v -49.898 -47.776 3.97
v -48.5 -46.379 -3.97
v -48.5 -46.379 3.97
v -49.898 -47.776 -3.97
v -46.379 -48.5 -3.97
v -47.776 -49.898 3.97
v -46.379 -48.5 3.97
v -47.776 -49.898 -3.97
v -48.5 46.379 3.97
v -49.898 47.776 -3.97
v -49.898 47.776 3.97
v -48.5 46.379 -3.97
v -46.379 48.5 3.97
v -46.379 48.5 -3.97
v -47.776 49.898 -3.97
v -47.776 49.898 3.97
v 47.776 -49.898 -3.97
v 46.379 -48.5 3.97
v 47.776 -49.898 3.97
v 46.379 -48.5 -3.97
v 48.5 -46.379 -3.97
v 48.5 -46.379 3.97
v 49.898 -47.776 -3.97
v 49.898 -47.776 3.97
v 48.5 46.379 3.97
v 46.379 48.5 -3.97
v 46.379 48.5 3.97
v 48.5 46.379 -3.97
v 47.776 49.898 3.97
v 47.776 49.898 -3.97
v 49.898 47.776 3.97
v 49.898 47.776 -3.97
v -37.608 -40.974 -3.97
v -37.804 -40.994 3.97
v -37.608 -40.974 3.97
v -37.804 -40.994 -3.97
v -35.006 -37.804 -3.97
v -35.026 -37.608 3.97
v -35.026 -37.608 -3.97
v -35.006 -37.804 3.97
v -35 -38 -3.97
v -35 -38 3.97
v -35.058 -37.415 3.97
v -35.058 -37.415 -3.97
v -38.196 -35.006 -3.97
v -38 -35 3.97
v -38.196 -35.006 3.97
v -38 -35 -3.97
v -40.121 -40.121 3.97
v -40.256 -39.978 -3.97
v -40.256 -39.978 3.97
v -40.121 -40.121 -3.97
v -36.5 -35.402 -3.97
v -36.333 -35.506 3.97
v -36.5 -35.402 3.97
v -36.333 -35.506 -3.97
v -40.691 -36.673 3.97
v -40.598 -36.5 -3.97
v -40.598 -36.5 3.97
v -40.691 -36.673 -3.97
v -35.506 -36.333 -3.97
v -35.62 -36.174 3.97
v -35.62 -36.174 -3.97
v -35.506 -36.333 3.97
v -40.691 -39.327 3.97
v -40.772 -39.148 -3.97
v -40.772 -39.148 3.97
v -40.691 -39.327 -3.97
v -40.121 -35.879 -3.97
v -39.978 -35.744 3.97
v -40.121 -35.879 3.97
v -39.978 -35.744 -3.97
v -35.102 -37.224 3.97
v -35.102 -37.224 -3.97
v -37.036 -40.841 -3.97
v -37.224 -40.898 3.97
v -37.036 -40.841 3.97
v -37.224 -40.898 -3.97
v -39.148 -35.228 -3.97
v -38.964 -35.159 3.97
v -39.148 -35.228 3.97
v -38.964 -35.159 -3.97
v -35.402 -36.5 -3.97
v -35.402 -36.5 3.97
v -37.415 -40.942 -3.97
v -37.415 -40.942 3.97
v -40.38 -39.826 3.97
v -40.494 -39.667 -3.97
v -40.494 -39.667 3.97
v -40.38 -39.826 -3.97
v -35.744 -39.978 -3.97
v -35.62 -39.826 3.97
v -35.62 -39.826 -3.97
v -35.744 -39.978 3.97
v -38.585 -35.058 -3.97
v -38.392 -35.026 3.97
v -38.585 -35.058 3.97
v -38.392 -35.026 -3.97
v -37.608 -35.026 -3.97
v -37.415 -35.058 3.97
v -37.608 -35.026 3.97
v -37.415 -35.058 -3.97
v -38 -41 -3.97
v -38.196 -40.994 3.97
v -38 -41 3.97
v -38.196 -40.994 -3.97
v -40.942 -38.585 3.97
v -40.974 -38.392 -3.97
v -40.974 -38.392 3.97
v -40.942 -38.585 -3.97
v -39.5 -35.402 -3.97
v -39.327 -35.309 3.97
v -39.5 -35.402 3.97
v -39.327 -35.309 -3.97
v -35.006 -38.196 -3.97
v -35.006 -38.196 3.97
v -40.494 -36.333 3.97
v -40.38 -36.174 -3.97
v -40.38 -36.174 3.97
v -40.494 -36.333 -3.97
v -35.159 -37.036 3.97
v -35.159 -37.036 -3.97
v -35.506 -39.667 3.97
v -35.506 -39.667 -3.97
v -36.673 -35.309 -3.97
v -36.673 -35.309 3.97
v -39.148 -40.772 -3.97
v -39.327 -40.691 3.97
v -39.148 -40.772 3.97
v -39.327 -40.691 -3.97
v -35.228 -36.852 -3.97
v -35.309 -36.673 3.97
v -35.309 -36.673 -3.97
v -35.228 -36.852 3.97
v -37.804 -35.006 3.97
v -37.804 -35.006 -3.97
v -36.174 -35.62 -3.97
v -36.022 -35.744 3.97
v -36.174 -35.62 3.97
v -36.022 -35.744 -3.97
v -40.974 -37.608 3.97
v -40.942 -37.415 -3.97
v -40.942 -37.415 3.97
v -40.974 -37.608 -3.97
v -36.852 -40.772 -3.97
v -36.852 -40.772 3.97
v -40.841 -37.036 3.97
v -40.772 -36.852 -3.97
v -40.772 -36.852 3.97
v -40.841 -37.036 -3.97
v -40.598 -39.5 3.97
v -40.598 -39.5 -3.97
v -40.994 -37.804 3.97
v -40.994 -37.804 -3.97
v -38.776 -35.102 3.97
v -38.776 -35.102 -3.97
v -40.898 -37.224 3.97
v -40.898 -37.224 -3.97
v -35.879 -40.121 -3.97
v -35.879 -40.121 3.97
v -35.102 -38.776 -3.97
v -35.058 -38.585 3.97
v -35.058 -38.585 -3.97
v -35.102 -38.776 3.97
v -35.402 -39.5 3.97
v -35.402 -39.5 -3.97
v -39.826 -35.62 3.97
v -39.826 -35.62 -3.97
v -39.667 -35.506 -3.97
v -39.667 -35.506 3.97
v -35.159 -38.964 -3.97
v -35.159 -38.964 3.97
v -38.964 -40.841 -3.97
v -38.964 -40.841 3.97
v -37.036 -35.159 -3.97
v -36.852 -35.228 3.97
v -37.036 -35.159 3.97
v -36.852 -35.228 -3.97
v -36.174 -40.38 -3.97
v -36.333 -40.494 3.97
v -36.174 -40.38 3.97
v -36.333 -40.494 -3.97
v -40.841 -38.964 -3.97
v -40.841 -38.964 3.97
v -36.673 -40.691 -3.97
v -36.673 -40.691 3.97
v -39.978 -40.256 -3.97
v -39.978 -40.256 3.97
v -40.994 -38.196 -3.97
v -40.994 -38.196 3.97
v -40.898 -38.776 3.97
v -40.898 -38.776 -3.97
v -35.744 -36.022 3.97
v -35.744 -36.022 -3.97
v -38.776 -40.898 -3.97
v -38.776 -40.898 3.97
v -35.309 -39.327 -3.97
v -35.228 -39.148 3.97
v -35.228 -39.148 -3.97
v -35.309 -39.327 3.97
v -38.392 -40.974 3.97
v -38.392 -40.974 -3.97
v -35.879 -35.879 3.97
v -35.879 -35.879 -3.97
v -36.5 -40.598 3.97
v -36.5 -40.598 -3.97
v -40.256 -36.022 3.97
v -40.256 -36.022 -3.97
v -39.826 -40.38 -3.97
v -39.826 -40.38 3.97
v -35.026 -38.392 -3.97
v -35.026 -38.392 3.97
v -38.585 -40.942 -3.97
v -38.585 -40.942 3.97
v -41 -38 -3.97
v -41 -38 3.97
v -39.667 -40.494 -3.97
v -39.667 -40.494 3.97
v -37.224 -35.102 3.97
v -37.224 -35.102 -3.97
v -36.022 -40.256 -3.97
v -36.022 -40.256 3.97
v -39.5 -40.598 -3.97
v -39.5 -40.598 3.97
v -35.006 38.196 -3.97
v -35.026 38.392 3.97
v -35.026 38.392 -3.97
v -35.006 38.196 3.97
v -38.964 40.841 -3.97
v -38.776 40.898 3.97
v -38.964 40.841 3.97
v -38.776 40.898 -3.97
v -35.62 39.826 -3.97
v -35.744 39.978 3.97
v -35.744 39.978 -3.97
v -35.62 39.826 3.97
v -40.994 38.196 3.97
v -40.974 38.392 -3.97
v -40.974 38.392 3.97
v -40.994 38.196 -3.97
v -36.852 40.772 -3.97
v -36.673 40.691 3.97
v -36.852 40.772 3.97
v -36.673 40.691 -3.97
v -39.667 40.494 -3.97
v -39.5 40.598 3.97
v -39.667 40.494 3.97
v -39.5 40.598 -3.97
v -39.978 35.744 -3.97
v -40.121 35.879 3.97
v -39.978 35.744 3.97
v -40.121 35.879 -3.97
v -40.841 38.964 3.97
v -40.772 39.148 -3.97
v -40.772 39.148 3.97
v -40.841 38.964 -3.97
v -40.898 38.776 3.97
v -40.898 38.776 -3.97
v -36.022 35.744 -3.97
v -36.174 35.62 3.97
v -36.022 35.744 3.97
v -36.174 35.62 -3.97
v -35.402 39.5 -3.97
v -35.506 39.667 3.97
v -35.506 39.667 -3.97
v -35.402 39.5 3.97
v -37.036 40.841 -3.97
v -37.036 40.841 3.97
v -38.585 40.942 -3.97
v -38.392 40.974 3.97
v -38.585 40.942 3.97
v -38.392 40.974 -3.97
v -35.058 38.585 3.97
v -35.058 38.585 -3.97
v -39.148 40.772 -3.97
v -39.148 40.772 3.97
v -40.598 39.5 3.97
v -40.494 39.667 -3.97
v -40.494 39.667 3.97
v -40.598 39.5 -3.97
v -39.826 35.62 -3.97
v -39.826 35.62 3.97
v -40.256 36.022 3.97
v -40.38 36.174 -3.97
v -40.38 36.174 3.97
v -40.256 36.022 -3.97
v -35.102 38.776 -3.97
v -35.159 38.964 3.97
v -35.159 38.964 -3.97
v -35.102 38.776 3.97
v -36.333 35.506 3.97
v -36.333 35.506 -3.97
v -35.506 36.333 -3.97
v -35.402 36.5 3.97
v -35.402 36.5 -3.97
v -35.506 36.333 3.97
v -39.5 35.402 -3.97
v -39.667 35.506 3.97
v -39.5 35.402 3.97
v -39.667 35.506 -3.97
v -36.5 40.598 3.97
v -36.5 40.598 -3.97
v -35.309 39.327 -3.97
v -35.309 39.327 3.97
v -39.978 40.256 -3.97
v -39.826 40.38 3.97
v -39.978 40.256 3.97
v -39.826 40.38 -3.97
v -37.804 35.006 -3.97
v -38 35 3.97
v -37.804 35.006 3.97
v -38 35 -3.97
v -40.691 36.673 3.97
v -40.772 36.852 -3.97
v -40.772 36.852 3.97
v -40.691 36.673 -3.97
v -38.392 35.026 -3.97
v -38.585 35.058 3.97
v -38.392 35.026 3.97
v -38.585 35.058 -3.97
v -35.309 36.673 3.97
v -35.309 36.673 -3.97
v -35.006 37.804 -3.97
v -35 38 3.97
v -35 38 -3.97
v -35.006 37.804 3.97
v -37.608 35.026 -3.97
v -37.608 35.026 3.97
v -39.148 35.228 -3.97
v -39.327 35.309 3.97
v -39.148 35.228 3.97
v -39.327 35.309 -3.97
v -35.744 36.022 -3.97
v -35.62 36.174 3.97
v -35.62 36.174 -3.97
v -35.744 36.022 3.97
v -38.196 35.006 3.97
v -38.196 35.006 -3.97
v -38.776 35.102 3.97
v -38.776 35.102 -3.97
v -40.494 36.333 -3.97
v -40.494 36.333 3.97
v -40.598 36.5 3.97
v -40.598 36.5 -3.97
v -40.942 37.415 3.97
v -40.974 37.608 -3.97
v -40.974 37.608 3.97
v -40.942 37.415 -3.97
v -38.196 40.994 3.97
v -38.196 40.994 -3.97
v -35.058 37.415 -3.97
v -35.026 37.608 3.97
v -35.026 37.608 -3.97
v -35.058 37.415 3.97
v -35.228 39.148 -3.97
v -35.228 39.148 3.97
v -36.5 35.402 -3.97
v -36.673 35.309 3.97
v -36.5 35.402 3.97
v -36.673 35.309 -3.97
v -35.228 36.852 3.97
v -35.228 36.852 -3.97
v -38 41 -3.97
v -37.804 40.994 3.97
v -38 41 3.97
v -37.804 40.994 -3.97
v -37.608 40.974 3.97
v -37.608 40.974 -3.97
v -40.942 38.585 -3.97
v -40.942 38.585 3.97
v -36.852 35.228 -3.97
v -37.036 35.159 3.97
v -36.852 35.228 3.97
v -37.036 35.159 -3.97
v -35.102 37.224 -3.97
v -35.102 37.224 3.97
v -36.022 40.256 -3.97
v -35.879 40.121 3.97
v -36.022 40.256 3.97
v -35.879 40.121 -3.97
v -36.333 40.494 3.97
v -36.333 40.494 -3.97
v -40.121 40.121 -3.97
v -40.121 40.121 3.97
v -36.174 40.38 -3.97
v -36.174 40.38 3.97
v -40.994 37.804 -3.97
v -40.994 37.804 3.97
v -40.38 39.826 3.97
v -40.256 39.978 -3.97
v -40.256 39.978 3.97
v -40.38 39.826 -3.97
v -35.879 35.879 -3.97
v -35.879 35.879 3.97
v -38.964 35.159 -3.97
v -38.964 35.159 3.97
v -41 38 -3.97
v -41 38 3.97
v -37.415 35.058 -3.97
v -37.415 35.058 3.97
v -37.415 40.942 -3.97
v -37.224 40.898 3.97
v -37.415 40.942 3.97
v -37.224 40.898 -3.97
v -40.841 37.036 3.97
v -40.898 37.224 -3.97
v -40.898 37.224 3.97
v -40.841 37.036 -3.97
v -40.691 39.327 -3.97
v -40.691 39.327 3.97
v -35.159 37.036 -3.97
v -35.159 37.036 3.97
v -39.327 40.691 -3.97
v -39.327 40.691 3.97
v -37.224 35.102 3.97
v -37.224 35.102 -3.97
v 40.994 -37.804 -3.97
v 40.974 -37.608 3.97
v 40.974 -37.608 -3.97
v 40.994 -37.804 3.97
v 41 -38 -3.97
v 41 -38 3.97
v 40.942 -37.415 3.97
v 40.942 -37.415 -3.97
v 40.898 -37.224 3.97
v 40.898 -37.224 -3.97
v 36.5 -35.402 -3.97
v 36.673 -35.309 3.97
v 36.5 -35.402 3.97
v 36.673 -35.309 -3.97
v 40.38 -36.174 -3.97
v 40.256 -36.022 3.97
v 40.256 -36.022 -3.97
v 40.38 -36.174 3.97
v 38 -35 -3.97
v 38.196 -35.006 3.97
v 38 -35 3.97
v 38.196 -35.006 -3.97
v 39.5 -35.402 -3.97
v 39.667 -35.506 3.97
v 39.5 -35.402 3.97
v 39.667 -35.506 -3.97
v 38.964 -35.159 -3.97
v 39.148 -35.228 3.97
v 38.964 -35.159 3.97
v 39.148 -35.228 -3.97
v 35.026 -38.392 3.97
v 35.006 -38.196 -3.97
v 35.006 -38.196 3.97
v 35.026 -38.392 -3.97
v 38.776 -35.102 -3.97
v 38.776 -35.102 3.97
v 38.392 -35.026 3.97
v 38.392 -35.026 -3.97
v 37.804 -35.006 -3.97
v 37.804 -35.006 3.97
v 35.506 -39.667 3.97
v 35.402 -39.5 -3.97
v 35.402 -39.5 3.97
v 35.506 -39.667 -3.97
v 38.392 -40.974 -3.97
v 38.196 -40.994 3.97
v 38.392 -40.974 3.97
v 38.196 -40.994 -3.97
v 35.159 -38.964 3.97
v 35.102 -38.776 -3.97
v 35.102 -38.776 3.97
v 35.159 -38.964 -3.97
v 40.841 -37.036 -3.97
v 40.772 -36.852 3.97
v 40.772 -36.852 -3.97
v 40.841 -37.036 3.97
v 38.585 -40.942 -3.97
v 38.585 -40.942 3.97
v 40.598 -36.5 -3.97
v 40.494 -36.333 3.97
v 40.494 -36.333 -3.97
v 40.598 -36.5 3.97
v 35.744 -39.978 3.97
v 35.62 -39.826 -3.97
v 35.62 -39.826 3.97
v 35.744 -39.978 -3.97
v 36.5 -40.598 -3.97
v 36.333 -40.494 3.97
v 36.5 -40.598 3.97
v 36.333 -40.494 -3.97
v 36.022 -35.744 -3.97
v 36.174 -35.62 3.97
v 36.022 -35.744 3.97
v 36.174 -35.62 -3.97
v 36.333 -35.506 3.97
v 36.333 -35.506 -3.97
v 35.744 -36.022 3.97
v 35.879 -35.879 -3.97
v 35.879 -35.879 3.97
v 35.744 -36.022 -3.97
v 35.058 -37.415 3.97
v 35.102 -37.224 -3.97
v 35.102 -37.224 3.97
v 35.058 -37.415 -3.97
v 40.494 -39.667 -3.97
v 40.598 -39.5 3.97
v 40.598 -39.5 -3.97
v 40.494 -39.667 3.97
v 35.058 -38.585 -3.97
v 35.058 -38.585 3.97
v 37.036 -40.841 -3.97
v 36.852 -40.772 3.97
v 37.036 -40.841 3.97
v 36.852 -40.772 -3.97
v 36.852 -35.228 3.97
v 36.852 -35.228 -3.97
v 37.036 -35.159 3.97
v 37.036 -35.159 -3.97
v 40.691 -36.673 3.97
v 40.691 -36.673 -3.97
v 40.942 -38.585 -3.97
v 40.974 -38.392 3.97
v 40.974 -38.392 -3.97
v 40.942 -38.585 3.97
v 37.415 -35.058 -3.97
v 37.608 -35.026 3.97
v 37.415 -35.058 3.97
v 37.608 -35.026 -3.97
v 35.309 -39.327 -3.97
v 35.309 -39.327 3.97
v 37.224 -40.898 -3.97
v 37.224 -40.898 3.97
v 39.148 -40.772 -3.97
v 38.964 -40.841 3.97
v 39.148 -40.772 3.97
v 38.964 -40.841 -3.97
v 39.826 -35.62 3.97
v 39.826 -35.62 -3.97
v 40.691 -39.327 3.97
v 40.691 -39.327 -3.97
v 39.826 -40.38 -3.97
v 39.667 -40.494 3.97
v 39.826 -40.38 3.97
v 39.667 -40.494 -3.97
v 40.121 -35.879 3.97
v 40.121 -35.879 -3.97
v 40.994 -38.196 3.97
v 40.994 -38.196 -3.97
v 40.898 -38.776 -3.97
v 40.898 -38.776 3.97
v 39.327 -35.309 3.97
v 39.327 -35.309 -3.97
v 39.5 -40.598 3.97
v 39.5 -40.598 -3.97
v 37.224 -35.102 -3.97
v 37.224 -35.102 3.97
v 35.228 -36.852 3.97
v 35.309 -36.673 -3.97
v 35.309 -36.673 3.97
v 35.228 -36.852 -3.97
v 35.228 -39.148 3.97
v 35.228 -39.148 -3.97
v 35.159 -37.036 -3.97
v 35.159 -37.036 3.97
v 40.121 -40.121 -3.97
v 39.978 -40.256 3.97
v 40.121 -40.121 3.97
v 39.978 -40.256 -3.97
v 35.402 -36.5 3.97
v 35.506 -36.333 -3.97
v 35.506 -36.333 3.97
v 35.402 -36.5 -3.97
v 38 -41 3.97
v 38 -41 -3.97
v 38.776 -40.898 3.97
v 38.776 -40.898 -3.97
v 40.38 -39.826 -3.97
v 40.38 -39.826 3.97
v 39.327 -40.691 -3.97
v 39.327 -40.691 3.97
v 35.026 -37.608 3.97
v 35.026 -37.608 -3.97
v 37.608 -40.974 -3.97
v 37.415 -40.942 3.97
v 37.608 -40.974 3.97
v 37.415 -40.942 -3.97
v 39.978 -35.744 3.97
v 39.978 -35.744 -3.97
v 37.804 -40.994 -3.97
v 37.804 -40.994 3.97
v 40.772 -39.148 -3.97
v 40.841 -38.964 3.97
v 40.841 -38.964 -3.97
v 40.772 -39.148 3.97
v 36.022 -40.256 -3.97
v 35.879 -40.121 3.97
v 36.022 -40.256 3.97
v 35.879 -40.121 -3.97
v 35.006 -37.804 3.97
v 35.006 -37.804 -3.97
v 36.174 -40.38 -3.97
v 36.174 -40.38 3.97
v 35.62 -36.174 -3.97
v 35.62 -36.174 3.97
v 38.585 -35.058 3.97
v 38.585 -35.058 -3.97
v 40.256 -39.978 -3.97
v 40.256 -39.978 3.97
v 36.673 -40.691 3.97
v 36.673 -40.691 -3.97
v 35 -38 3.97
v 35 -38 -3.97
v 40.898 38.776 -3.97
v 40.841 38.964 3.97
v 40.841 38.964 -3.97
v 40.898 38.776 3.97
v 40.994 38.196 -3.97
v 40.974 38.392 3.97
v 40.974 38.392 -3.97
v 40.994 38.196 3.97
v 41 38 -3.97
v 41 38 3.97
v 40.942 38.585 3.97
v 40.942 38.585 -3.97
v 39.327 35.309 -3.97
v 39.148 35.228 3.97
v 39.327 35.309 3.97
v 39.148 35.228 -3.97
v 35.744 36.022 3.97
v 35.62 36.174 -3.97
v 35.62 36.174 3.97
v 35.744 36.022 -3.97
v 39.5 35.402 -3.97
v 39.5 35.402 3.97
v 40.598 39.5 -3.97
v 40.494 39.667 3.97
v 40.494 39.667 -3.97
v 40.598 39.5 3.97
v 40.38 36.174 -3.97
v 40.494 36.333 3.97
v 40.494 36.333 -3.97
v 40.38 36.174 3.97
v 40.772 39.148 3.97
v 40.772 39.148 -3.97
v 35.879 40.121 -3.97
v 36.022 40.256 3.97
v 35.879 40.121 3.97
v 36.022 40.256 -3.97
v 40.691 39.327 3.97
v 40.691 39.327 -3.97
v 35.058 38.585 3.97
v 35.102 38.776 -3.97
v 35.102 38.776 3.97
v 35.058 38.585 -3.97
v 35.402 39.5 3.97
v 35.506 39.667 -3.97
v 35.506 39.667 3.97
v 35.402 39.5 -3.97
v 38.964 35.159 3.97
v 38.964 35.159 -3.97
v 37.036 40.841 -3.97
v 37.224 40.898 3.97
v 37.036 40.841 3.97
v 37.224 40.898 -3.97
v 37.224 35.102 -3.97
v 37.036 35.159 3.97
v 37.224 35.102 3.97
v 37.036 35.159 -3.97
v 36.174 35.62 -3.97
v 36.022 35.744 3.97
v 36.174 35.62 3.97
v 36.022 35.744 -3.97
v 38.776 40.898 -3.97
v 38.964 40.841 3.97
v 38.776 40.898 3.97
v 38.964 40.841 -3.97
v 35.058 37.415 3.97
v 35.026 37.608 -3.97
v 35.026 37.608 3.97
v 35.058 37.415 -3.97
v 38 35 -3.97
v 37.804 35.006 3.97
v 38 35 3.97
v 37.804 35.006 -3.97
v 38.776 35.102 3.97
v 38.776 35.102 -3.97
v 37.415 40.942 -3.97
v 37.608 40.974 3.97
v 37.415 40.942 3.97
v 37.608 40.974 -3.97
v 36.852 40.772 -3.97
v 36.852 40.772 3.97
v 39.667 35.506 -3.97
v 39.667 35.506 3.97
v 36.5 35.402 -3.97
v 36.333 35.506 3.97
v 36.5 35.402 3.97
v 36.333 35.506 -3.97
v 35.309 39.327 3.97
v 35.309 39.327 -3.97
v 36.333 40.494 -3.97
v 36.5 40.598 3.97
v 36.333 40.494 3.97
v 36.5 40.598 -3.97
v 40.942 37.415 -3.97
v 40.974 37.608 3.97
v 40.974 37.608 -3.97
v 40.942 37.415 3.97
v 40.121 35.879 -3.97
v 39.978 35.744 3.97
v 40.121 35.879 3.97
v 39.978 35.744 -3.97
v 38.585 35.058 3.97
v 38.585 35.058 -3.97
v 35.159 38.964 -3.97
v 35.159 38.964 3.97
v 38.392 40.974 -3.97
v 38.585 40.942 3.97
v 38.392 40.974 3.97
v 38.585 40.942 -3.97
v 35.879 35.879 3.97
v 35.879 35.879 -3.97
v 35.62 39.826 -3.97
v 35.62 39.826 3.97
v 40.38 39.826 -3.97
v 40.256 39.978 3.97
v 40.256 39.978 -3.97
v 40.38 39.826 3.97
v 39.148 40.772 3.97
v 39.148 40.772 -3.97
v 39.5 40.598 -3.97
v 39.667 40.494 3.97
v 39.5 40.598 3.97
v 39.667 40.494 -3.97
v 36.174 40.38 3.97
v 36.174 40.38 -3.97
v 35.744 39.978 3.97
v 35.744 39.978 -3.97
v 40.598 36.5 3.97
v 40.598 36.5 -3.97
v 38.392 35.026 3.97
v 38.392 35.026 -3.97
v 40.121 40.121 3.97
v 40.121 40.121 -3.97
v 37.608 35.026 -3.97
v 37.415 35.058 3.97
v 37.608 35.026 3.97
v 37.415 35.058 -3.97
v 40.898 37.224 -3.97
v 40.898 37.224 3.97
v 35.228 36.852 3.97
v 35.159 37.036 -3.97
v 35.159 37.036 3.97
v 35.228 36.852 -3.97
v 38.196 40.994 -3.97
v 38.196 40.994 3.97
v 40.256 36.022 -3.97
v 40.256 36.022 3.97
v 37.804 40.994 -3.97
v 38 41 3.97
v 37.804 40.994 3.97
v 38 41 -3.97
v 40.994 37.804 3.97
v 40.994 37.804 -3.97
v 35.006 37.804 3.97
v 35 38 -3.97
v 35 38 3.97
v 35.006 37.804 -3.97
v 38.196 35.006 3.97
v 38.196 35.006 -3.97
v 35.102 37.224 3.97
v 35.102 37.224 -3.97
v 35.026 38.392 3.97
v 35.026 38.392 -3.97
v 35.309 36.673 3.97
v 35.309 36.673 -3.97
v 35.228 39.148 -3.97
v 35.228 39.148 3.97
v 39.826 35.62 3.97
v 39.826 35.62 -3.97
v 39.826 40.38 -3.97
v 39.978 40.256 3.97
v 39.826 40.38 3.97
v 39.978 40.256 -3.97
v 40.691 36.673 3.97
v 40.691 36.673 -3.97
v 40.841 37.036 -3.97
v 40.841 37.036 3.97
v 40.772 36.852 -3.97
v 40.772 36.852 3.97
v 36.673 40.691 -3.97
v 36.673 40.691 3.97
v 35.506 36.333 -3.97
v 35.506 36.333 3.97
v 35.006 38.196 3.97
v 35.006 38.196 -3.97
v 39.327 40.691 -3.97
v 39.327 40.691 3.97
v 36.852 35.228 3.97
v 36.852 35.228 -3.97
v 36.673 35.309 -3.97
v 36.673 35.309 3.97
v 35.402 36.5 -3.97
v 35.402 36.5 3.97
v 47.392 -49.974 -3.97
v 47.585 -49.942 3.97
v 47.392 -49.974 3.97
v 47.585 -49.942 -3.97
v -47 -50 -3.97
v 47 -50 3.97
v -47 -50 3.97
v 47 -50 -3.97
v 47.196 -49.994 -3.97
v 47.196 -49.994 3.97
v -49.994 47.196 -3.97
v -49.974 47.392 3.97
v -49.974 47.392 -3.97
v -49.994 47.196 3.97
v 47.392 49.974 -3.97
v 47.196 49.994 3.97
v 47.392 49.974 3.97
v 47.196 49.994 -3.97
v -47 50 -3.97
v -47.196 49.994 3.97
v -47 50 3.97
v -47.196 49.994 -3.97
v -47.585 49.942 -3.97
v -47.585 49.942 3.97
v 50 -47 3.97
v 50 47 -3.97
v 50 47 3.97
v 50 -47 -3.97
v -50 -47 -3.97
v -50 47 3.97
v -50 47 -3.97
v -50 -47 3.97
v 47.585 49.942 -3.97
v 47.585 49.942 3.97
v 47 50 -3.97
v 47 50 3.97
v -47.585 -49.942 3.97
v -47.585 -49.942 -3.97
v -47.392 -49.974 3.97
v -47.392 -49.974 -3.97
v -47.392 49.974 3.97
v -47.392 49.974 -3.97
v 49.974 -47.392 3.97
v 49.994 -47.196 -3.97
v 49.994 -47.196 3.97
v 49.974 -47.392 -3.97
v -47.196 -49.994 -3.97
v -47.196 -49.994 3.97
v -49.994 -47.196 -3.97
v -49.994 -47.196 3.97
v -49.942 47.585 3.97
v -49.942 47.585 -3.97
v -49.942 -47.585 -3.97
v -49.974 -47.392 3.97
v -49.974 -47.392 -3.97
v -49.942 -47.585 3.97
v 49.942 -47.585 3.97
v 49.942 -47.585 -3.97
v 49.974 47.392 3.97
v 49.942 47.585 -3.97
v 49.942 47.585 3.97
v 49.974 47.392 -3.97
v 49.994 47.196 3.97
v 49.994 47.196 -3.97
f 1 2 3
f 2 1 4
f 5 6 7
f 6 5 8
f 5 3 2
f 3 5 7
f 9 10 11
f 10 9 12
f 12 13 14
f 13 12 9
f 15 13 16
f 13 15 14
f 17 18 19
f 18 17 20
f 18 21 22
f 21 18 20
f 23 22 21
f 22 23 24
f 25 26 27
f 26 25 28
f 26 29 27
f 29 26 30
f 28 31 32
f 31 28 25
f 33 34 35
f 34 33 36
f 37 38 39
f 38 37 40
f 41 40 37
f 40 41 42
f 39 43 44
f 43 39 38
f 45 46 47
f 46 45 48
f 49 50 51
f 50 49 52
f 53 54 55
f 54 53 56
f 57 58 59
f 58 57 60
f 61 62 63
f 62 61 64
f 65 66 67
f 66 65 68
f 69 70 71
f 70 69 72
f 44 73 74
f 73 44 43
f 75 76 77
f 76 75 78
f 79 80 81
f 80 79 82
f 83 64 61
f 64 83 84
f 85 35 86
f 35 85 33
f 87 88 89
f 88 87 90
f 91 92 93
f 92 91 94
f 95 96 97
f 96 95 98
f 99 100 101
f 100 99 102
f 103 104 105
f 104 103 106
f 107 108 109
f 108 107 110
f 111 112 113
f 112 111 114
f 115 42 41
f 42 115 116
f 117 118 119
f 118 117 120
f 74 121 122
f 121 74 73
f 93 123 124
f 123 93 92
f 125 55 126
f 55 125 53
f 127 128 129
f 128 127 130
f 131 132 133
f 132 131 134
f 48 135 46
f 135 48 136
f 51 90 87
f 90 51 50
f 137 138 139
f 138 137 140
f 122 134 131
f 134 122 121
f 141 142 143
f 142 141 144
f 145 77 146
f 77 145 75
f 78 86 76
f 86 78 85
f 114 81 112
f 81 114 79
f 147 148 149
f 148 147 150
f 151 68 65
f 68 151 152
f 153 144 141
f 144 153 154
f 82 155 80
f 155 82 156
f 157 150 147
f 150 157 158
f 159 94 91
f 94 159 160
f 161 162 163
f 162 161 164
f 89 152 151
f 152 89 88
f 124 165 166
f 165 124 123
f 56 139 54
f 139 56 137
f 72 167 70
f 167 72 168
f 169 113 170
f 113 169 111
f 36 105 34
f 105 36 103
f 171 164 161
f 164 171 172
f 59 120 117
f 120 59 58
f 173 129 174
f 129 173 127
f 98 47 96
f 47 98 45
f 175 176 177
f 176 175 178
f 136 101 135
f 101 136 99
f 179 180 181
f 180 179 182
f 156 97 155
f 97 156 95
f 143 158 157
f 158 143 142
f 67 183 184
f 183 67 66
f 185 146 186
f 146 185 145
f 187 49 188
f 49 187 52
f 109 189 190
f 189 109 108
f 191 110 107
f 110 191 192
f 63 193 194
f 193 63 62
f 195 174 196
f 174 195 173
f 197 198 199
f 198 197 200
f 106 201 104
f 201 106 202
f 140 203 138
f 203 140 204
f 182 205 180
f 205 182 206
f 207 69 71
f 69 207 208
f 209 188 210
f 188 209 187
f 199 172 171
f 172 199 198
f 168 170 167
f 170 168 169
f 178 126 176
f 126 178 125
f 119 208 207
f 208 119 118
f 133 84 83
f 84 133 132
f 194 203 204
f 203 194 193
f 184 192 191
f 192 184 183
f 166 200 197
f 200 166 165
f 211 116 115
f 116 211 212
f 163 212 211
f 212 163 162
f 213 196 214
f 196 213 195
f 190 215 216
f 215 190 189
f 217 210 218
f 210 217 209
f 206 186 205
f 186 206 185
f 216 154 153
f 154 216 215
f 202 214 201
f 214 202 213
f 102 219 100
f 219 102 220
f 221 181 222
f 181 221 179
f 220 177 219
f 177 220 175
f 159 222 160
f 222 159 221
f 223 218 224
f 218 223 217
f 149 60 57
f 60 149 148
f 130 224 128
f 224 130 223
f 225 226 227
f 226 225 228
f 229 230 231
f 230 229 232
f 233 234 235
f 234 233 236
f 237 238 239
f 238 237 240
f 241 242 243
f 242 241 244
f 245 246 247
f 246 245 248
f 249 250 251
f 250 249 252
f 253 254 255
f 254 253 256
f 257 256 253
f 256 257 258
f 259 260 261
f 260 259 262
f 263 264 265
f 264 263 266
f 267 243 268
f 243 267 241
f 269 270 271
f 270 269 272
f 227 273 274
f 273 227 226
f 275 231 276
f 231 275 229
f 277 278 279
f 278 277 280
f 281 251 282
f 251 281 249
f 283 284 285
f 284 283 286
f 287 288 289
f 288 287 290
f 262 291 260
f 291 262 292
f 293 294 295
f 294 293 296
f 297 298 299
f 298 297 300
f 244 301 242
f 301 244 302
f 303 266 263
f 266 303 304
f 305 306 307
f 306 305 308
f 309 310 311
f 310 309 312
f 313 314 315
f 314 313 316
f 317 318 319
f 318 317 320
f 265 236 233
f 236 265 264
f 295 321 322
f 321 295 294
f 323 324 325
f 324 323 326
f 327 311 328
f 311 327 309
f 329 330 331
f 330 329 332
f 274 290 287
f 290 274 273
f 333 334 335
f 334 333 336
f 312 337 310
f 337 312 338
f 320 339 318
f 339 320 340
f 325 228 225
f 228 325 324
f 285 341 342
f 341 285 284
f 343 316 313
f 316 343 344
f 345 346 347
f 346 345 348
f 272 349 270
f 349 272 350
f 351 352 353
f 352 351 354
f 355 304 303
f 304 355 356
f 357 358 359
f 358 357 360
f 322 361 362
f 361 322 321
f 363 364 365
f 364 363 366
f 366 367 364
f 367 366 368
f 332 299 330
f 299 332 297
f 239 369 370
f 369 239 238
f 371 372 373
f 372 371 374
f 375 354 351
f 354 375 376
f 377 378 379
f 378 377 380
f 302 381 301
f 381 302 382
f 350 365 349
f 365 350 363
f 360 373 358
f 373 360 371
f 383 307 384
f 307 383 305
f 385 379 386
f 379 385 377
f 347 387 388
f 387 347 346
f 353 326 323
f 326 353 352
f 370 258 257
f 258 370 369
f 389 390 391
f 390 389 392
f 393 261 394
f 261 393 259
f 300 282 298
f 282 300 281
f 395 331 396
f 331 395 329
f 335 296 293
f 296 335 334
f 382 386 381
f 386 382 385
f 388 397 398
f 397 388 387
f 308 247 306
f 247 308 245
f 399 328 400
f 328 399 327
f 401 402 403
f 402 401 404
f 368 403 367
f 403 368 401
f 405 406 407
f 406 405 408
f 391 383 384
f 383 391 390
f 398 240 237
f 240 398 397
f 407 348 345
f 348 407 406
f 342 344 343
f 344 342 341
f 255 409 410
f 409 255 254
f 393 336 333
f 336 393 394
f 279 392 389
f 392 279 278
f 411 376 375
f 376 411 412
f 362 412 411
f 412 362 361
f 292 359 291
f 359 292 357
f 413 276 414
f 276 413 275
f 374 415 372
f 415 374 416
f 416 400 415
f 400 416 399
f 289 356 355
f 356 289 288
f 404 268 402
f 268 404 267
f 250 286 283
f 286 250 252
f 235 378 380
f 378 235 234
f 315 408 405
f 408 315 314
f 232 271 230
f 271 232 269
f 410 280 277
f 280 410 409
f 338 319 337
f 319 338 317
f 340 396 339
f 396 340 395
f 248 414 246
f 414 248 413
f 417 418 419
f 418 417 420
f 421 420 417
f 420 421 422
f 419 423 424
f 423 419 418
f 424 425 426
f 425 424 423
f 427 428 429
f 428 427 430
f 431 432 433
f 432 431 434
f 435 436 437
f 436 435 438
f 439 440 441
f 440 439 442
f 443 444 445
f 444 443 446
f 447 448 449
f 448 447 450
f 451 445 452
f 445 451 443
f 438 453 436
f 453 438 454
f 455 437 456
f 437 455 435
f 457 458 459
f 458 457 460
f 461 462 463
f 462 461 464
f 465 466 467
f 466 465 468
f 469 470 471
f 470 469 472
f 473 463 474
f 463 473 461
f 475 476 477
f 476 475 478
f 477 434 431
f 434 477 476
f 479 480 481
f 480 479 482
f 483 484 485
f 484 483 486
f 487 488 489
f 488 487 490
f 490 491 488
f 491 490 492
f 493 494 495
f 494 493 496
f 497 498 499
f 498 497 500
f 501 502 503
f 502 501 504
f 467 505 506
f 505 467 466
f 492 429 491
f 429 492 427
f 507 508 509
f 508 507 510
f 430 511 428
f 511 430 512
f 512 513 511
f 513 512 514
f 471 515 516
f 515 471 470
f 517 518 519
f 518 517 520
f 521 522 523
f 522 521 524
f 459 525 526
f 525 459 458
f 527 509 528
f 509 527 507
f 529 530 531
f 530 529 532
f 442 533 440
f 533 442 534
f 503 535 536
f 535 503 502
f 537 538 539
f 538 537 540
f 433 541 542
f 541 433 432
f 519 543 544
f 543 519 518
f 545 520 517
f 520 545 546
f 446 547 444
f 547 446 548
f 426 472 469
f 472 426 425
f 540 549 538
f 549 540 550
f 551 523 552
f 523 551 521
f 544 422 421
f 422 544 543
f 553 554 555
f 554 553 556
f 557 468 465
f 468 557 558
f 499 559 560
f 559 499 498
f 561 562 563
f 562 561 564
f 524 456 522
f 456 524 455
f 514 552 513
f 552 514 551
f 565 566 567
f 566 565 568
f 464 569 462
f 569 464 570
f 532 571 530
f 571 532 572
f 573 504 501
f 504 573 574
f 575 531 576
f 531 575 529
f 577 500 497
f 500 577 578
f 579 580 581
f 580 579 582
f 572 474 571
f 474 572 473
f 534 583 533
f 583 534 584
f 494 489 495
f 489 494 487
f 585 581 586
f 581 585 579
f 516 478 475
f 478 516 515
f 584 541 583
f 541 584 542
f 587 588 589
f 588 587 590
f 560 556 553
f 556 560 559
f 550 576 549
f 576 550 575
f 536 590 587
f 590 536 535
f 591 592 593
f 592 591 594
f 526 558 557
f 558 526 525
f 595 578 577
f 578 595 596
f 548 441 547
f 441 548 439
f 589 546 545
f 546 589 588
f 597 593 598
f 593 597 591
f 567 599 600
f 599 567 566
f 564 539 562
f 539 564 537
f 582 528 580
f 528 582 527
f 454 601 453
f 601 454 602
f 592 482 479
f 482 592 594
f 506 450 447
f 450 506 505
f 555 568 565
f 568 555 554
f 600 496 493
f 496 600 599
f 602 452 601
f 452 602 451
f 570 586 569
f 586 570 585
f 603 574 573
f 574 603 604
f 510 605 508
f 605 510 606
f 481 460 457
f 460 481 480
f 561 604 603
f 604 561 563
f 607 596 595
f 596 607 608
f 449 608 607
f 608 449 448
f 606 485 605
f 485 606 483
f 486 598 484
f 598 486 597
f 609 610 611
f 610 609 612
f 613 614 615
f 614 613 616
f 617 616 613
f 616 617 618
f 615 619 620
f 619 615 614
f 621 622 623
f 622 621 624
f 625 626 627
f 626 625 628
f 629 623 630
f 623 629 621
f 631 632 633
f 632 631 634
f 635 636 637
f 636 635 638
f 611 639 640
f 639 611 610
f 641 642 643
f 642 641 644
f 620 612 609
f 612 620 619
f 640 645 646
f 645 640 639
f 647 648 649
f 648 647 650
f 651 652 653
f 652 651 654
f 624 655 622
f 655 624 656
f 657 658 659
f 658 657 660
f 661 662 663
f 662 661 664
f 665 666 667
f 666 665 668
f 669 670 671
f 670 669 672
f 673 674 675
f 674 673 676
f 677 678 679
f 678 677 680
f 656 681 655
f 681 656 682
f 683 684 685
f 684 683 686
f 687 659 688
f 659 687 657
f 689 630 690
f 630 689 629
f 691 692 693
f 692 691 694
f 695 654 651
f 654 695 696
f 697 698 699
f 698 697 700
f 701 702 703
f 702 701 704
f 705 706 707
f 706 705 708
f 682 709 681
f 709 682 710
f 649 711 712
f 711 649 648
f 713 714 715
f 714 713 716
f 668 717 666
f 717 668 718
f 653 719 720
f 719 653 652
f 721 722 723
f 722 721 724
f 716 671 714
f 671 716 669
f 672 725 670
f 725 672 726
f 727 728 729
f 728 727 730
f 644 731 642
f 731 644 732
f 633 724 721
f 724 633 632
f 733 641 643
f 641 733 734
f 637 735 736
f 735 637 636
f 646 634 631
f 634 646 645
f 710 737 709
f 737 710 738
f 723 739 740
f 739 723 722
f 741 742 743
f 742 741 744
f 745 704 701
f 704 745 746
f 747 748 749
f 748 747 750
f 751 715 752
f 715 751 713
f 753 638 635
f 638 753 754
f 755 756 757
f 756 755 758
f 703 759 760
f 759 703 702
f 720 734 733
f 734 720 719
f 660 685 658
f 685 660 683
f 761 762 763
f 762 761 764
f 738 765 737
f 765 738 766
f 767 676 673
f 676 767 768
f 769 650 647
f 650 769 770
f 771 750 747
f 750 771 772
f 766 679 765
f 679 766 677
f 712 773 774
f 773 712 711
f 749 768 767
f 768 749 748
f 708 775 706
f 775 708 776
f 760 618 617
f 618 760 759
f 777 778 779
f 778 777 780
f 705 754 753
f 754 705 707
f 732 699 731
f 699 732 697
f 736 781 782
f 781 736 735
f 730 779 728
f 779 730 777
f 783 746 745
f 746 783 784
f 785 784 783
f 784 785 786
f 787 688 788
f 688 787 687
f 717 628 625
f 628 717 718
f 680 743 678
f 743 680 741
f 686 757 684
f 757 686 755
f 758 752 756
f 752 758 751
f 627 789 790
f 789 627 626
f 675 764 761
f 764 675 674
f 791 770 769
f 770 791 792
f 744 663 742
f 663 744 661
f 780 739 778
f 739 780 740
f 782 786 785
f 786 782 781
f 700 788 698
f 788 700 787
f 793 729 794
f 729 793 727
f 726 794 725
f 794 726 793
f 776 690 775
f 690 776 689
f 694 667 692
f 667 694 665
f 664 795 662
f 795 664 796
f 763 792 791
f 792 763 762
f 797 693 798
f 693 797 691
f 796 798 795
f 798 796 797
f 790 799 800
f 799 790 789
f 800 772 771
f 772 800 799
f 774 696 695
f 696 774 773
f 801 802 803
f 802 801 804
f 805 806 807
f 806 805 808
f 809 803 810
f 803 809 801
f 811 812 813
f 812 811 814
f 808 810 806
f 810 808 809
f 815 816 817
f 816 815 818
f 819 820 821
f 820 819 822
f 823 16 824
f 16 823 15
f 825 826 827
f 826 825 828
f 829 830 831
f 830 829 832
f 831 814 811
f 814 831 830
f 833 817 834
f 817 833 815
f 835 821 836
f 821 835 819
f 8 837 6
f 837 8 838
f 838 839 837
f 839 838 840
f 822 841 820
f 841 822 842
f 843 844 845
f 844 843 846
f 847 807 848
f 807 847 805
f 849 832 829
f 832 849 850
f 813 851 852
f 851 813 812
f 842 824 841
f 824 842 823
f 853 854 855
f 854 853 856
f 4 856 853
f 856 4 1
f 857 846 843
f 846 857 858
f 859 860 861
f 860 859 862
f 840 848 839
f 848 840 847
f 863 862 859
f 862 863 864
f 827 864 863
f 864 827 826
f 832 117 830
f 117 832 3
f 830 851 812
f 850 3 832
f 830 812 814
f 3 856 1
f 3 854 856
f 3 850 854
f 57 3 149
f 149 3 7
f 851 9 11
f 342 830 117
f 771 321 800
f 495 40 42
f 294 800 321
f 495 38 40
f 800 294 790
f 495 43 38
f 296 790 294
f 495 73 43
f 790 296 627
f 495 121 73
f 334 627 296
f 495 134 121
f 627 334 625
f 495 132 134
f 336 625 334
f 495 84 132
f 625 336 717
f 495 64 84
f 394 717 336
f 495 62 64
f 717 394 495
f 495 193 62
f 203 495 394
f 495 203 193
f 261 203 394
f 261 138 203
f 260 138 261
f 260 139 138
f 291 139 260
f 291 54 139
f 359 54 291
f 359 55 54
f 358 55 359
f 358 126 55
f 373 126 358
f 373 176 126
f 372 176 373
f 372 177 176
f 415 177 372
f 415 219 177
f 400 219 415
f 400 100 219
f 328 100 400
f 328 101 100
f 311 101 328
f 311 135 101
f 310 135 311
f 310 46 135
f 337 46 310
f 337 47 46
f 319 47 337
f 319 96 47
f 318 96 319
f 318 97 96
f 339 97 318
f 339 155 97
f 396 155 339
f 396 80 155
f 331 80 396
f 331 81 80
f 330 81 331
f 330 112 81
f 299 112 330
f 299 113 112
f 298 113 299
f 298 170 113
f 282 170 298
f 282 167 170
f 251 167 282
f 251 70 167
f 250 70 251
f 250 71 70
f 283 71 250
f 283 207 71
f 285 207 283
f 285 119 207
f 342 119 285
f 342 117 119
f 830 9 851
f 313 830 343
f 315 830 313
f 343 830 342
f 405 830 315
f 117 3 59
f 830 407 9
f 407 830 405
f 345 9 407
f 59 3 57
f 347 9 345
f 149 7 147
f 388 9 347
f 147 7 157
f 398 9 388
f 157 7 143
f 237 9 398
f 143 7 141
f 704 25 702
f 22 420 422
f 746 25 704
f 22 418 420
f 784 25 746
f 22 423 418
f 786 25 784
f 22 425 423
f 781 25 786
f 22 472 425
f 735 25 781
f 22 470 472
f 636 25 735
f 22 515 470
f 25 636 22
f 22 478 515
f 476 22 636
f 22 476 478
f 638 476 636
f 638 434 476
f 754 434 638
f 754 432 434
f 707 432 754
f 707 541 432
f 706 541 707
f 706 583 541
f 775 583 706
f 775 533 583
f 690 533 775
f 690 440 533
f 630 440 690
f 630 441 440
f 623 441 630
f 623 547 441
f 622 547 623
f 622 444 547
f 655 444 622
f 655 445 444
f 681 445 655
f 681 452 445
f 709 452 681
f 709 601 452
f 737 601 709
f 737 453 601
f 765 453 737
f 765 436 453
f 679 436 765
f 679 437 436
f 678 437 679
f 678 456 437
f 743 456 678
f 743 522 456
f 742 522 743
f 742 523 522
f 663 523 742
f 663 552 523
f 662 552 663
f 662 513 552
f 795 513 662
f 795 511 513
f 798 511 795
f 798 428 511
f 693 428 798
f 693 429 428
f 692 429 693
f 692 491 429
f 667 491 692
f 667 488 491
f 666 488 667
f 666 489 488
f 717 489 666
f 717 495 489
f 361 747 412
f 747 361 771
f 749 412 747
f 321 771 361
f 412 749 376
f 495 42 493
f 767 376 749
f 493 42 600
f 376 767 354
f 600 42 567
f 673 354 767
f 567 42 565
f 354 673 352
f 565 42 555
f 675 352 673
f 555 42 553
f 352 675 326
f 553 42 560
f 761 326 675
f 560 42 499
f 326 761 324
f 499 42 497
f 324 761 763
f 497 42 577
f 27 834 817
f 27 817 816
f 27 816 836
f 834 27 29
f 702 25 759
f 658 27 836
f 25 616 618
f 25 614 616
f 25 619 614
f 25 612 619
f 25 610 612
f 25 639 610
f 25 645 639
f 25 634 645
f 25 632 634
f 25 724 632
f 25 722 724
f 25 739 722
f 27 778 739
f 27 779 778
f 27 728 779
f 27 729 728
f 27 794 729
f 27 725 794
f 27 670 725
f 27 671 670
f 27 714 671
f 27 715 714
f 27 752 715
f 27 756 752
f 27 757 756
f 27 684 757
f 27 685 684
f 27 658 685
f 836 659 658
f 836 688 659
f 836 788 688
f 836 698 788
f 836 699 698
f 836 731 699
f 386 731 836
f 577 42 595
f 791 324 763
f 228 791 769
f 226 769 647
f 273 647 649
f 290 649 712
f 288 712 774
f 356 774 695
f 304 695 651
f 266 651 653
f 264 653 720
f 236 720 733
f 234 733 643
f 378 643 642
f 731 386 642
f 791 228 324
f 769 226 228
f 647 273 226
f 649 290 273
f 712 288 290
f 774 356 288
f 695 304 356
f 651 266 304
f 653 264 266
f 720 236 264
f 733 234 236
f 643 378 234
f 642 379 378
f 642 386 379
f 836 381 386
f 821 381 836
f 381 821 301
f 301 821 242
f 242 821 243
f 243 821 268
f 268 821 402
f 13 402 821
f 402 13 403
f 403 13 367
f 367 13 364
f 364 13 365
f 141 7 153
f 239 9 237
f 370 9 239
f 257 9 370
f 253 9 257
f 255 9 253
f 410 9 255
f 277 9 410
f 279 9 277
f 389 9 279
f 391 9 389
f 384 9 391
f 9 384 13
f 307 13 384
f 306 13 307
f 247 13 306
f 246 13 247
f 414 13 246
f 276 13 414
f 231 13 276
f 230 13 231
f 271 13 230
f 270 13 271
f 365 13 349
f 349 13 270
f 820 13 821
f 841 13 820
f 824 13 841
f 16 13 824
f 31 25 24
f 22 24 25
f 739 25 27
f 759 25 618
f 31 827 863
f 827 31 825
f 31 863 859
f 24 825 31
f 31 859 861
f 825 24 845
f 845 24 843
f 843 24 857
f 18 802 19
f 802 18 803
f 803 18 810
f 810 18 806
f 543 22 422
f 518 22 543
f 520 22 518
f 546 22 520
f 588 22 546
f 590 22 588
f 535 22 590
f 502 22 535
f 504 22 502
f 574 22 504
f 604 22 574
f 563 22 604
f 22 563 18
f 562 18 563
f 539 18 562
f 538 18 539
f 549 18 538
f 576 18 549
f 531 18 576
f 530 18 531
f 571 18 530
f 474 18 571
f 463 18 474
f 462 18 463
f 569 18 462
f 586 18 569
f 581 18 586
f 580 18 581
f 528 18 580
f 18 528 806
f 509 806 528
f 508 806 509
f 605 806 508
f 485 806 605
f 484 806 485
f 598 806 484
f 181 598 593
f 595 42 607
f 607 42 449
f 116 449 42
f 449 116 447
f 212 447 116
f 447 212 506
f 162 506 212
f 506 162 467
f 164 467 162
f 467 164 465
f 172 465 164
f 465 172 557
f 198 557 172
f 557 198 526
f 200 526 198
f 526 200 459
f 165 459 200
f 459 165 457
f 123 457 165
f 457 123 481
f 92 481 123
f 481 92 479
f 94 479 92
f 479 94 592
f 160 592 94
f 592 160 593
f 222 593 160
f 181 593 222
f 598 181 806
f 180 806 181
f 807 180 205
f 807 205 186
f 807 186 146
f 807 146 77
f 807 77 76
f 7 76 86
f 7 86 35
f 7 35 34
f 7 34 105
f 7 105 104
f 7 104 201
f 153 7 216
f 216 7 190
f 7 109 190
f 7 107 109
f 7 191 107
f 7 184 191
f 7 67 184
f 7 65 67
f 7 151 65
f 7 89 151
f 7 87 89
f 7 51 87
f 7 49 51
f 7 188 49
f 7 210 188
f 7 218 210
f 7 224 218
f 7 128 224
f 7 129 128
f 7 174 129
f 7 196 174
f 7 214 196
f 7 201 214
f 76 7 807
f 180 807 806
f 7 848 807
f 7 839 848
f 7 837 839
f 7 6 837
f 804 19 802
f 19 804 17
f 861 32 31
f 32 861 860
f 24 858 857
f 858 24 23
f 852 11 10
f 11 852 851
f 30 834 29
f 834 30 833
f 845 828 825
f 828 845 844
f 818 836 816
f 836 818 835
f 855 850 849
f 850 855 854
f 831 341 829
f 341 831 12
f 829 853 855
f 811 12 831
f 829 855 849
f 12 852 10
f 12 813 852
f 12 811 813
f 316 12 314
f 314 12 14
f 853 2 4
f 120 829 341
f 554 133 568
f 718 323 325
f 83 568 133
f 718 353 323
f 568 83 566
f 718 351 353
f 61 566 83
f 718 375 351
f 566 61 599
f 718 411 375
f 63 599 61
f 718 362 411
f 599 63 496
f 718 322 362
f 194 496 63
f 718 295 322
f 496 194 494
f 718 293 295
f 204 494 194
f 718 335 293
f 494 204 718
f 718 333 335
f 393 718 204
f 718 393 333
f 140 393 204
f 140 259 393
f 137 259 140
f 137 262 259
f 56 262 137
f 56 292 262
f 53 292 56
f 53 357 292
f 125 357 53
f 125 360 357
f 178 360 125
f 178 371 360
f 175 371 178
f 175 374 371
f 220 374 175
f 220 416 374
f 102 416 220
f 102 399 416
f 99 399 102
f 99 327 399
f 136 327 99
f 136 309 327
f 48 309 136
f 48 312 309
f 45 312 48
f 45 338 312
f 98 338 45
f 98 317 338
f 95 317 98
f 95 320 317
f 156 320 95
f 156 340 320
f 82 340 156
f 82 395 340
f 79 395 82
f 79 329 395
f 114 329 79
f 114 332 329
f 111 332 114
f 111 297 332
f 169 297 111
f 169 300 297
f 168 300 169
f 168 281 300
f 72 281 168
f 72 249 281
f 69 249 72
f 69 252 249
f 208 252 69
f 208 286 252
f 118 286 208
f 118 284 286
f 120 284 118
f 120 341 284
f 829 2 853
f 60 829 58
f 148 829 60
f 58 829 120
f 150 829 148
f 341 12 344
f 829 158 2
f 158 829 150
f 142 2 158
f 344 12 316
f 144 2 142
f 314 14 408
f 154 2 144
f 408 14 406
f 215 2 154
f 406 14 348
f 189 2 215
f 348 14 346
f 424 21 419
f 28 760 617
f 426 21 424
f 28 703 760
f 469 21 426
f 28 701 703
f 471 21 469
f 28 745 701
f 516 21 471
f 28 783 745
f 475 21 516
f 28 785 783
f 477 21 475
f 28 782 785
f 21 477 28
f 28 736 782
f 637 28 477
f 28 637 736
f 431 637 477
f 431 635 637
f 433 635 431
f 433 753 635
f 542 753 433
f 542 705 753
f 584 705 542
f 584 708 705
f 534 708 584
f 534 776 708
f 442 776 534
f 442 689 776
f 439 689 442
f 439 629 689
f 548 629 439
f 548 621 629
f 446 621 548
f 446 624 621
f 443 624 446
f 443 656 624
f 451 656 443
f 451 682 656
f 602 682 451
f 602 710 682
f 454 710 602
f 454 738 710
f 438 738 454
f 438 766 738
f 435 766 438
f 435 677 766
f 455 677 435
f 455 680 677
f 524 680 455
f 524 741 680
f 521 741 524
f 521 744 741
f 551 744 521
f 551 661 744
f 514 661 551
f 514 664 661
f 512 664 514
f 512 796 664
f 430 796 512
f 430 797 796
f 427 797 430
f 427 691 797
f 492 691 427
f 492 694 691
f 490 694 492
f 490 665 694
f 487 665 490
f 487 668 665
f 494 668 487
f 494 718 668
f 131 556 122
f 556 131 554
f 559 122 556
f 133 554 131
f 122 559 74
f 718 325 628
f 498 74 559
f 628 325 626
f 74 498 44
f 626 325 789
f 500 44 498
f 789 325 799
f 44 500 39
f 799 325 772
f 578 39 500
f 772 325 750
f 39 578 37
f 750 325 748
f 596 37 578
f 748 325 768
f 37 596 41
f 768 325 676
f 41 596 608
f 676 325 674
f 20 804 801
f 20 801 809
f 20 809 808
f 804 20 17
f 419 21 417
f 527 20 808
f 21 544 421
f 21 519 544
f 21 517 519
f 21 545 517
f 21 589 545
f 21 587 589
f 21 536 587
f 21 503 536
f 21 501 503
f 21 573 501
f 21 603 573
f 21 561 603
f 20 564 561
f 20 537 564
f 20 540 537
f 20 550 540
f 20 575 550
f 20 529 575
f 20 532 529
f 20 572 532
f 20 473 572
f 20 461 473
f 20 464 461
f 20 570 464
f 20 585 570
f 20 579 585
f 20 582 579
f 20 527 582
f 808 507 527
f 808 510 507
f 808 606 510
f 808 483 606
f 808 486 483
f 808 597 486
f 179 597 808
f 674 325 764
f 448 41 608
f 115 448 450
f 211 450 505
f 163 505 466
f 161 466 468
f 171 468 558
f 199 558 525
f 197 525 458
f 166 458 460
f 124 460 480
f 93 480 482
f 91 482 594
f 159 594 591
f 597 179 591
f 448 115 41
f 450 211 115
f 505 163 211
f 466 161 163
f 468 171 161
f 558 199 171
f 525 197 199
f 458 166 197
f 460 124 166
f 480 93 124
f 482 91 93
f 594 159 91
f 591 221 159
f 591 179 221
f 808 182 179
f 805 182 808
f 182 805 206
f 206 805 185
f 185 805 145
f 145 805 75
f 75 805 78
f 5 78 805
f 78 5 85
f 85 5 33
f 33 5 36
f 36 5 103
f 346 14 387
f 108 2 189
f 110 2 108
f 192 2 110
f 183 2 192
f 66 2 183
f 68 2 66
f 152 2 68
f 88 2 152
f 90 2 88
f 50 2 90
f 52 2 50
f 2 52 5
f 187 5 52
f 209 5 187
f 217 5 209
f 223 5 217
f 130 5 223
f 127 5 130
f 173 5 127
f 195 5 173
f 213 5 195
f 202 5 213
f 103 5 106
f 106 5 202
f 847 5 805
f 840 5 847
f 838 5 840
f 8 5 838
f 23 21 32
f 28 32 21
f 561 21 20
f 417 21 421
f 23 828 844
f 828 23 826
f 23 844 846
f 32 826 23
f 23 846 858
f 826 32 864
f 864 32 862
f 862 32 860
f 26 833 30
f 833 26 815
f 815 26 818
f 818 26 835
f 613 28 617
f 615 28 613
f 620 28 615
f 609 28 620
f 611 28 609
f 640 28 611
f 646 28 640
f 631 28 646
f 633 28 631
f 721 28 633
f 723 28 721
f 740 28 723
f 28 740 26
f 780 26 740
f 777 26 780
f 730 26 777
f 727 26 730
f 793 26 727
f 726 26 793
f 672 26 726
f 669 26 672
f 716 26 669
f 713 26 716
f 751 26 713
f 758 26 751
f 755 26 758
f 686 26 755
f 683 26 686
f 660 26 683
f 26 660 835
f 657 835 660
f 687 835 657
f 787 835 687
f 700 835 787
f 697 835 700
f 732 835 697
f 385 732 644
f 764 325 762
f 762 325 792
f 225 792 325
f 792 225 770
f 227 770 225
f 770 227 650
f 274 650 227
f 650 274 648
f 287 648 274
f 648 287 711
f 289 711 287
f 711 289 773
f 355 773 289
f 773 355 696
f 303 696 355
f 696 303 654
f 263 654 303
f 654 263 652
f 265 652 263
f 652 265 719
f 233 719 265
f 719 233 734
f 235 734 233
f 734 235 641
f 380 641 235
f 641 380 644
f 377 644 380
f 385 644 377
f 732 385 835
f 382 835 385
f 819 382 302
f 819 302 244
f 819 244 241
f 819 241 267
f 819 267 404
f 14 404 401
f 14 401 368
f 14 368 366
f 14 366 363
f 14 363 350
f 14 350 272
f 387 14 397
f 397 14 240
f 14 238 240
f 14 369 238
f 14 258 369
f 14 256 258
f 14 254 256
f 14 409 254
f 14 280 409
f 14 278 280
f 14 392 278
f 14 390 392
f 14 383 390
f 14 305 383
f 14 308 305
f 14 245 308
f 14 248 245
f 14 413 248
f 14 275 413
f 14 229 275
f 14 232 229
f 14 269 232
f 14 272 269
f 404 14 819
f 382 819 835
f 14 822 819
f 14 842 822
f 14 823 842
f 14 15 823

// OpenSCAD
$fn = 96;

// Parameters (mm)
sheet_L = 100;                 // length
sheet_W = 100;                 // width
sheet_T = 7.94;                // ~5/16" = 7.9375mm
corner_r = 3;                  // outer corner fillet radius
edge_chamfer = 1.5;            // 45° chamfer size (inset from each edge)
hole_d = 6;                    // mounting hole diameter
hole_edge_offset = 12;         // hole center offset from each edge
overlap = 0.2;                 // small overlap for robust booleans

// Guardrails to avoid empty/invalid geometry
corner_r_eff = min(corner_r, min(sheet_L, sheet_W)/2 - overlap);
chamfer_eff  = min(edge_chamfer, min(sheet_L, sheet_W)/2 - overlap);
hole_off_x   = min(hole_edge_offset, sheet_L/2 - hole_d/2 - overlap);
hole_off_y   = min(hole_edge_offset, sheet_W/2 - hole_d/2 - overlap);

module rounded_rect_prism(L, W, T, R) {
    linear_extrude(height=T, center=true)
        offset(r=R)
            square([L - 2*R, W - 2*R], center=true);
}

module chamfer_cuts(L, W, T, c) {
    // Cut 45° chamfers at the four corners (top view)
    for (sx = [-1, 1], sy = [-1, 1]) {
        translate([sx*(L/2 - c), sy*(W/2 - c), 0])
            rotate([0, 0, 45])
                cube([2*c, 2*c, T + 2*overlap], center=true);
    }
}

module mounting_holes(L, W, T, d, offx, offy) {
    for (sx = [-1, 1], sy = [-1, 1]) {
        translate([sx*(L/2 - offx), sy*(W/2 - offy), 0])
            cylinder(d=d, h=T + 2*overlap, center=true);
    }
}

module complete_model() {
    difference() {
        rounded_rect_prism(sheet_L, sheet_W, sheet_T, corner_r_eff);
        chamfer_cuts(sheet_L, sheet_W, sheet_T, chamfer_eff);
        mounting_holes(sheet_L, sheet_W, sheet_T, hole_d, hole_off_x, hole_off_y);
    }
}

color("Silver") complete_model();
